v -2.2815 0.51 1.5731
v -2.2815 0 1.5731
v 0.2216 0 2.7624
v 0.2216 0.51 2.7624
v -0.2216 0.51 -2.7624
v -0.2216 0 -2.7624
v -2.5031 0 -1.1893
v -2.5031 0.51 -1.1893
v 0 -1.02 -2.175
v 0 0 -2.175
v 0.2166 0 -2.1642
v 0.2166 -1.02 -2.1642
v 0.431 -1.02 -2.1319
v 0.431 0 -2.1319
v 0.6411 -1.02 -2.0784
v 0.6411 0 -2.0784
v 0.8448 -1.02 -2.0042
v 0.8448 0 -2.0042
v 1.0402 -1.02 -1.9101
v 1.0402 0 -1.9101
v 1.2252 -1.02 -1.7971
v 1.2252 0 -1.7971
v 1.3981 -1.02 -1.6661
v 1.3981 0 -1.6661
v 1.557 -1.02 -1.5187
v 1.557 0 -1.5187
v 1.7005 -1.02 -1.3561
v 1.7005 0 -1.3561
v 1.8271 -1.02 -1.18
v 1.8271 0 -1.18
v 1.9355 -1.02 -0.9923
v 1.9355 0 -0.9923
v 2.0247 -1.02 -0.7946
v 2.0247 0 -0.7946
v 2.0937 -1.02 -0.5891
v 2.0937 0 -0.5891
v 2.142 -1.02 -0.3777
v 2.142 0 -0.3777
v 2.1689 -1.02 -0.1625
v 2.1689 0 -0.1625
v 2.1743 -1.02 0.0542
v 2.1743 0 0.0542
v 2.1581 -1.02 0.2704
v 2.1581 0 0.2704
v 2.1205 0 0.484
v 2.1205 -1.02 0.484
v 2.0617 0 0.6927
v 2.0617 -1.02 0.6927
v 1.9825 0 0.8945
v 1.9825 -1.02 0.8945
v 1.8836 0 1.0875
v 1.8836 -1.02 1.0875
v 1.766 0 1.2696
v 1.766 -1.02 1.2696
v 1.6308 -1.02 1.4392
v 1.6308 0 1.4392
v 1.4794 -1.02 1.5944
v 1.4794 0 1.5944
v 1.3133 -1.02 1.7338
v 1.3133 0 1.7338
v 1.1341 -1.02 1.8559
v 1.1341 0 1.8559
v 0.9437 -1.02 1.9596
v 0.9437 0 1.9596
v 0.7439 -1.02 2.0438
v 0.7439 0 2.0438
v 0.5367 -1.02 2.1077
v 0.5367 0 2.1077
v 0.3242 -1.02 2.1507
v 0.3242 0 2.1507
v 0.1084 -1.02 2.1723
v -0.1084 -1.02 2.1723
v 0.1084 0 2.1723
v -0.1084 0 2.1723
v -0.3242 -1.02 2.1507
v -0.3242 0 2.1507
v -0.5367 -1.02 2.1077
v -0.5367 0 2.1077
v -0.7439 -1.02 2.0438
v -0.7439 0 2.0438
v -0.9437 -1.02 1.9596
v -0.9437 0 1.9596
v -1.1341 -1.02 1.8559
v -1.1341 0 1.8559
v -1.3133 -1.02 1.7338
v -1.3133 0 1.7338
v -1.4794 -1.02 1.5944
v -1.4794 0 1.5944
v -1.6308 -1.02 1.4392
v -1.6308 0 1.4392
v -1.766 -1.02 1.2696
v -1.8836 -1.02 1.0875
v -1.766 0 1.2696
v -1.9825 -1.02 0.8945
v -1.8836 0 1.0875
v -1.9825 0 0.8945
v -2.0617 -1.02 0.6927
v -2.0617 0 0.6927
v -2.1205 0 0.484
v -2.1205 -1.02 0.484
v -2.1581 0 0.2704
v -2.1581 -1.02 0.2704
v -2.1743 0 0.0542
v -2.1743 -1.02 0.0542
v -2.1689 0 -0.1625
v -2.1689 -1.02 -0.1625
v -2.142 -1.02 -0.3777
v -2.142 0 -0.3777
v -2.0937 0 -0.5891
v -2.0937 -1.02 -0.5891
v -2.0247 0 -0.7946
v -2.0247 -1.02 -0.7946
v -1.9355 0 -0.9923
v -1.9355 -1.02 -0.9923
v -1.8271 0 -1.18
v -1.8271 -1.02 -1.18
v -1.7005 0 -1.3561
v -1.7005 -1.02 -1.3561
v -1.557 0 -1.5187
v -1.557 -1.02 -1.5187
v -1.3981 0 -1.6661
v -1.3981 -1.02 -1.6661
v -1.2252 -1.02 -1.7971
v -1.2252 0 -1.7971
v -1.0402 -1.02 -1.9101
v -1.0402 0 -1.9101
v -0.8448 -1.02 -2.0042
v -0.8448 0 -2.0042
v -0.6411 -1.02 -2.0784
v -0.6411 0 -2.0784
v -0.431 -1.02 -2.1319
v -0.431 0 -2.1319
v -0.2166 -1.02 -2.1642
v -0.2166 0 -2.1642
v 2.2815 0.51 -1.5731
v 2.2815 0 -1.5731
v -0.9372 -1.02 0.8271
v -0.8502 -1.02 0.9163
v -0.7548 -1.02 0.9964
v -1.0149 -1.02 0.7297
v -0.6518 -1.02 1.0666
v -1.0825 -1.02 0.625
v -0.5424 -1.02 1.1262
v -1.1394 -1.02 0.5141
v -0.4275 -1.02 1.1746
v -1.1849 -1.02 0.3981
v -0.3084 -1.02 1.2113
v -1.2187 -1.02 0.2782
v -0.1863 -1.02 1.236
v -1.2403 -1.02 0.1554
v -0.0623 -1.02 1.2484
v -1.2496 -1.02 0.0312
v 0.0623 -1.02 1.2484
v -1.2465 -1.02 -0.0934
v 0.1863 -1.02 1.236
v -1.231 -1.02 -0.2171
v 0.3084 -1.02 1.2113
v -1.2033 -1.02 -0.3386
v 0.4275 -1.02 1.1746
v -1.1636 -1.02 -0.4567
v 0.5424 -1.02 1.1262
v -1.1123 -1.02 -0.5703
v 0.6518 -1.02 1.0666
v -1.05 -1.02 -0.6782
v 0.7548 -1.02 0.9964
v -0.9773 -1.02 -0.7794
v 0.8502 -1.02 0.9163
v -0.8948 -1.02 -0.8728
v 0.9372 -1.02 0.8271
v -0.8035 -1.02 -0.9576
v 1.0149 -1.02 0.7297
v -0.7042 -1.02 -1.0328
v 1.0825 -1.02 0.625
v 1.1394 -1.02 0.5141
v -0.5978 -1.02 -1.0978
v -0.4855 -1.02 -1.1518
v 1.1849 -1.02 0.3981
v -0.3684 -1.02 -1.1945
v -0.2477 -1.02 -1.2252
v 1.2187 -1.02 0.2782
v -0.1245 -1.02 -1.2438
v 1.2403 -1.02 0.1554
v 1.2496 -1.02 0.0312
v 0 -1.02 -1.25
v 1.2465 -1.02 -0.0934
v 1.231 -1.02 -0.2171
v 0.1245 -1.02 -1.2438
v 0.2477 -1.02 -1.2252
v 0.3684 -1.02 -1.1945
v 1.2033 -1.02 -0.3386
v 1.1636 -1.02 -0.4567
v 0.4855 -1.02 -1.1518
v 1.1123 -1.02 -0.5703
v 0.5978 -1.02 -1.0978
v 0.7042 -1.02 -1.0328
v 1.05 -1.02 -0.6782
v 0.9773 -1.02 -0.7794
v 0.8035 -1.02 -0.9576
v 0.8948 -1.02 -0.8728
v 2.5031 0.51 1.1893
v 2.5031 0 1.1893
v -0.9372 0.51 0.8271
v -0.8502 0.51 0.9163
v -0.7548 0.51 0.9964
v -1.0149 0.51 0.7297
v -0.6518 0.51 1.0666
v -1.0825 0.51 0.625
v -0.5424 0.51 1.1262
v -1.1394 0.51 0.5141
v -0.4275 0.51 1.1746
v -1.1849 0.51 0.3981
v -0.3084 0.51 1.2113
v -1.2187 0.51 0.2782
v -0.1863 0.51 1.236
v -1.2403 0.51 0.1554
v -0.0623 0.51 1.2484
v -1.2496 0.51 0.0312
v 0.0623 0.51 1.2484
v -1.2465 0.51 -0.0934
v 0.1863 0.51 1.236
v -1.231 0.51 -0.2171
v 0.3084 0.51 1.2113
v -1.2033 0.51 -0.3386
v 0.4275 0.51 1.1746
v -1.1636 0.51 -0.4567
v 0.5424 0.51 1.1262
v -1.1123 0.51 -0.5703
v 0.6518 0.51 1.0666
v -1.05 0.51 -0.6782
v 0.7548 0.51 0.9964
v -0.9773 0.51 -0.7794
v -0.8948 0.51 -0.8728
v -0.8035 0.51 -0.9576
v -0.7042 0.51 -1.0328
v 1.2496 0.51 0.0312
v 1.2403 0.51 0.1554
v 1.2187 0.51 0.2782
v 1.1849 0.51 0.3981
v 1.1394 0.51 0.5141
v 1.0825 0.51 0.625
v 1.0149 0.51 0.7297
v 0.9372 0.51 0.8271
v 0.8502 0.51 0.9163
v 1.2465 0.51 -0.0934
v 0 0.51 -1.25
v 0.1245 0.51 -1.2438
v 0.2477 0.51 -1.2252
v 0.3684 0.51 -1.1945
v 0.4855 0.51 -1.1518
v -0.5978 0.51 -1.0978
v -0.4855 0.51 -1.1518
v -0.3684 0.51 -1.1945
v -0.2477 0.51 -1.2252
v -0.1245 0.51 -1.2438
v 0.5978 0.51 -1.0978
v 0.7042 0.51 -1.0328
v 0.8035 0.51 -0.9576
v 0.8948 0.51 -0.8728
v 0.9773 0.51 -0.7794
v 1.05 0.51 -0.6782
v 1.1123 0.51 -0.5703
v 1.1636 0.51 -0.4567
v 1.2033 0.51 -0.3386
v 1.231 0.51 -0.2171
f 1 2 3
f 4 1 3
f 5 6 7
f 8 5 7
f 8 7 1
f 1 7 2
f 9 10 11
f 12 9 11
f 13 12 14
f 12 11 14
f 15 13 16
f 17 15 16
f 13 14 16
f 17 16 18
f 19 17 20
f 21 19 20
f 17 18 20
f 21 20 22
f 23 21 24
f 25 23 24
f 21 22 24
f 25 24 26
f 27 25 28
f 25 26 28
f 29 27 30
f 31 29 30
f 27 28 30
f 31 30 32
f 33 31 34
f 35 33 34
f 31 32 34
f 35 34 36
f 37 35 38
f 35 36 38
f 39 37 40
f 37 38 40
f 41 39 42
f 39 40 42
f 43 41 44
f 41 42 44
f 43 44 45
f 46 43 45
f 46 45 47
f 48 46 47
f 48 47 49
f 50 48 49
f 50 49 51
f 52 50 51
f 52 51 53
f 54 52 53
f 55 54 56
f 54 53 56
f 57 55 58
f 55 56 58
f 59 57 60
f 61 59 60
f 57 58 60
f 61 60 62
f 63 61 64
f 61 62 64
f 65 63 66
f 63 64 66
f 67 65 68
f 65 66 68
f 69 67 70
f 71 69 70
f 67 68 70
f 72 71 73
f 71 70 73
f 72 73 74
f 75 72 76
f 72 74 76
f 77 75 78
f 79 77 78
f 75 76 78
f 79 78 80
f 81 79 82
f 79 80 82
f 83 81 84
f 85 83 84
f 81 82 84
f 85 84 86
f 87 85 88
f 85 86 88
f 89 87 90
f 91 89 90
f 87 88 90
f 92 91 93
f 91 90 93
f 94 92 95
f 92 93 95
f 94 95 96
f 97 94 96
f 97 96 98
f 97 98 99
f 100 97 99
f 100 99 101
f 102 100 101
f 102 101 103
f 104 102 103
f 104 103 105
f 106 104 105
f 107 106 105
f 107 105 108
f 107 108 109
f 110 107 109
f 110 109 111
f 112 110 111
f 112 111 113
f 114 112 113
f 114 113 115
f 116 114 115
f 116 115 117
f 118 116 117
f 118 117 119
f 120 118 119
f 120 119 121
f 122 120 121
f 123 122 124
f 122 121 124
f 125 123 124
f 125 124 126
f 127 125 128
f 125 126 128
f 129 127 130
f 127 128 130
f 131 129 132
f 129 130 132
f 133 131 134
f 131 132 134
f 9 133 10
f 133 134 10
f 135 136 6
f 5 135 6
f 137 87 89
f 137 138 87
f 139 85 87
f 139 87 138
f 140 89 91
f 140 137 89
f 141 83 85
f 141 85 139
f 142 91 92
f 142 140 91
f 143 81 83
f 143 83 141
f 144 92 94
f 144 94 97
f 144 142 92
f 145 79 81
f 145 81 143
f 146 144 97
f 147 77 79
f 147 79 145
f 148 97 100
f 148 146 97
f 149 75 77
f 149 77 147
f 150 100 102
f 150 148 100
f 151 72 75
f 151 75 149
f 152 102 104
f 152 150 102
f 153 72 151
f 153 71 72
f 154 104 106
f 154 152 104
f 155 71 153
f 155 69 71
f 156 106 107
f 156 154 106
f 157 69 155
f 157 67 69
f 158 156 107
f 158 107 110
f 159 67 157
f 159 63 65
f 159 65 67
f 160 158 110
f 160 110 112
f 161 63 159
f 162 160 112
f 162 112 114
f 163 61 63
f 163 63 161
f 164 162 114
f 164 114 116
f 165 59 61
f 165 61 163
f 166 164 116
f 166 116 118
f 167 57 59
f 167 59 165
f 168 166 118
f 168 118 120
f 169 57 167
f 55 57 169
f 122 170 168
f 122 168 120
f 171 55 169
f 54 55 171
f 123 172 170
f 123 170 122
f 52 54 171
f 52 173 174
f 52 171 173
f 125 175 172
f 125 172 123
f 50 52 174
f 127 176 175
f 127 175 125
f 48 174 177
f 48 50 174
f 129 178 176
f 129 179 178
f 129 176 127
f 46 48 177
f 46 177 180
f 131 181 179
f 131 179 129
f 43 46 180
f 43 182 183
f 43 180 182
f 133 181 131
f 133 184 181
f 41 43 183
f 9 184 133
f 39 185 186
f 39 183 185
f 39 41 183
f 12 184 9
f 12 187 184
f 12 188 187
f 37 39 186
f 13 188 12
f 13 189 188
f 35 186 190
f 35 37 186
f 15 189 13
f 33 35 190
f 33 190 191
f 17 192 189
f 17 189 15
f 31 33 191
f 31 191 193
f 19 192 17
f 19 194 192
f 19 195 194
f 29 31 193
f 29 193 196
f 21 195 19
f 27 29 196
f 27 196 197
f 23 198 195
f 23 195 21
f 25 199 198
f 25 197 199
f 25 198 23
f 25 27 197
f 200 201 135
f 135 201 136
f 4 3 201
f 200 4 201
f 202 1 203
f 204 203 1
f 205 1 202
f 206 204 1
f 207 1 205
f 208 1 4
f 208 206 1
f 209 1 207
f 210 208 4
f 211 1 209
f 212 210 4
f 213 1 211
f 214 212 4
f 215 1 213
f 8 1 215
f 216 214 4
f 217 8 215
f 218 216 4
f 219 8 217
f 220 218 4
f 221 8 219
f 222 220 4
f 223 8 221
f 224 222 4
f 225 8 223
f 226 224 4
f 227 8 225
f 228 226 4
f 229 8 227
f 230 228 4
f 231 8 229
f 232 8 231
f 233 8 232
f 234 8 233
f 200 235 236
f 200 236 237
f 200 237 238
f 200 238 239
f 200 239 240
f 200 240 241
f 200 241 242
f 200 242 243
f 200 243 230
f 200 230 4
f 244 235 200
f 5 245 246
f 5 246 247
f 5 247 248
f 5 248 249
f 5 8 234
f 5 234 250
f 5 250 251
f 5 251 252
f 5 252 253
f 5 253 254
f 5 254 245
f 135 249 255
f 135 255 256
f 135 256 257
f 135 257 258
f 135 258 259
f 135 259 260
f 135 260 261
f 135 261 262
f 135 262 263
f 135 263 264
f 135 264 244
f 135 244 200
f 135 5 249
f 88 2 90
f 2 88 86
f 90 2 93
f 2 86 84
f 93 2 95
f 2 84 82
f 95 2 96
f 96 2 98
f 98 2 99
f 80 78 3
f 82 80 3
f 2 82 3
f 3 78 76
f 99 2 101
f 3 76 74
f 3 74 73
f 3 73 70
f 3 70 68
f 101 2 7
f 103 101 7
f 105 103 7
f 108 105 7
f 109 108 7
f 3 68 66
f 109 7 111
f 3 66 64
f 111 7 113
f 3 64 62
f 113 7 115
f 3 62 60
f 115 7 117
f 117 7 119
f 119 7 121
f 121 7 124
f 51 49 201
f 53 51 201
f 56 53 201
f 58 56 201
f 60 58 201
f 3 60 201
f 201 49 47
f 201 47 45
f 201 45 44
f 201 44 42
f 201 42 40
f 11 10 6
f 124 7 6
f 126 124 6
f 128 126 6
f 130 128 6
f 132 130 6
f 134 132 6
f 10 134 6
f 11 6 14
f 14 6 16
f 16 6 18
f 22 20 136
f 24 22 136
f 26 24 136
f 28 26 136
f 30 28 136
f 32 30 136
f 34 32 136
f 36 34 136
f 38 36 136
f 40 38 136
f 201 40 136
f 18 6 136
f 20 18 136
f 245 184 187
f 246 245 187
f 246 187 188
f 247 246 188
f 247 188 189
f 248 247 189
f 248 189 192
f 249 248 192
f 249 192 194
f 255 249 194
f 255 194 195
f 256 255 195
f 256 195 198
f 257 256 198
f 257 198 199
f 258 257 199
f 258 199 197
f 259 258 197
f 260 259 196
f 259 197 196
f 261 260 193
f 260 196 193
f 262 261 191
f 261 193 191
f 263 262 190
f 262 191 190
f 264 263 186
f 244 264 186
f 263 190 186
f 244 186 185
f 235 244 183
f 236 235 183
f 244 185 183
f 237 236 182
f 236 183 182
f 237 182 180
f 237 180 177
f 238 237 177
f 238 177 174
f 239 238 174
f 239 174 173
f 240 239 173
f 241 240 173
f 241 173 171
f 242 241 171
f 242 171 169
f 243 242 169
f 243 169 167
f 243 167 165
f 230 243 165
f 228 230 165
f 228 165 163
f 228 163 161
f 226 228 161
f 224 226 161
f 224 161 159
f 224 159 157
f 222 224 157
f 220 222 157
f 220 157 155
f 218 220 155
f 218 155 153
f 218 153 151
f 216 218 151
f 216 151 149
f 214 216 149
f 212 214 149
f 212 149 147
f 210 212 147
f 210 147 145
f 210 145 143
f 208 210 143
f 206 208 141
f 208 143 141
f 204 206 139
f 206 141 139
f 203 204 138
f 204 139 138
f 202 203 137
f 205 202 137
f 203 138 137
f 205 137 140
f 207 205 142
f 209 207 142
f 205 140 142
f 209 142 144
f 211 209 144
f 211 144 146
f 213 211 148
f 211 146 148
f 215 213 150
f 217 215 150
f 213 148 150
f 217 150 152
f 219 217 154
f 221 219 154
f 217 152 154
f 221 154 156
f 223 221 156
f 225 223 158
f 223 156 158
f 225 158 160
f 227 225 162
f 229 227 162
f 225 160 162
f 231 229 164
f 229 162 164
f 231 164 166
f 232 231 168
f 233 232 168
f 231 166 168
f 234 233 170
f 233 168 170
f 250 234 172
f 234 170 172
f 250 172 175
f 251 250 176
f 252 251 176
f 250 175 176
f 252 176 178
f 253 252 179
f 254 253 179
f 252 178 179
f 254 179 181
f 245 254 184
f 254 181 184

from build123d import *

# Parameters (mm, degrees)
EXTRUDE_1_DEPTH     = 0.51
SKETCH_2_R          = 2.175
EXTRUDE_2_DEPTH     = 1.02
SKETCH_3_R          = 1.25
CUT_EXTRUDE_1_DEPTH = 5.029563181


with BuildPart() as part:
    # 草图1 → 凸台-拉伸1 (new body)
    with BuildSketch(Plane(origin=(0, 0, 0), x_dir=(1, 0, 0), z_dir=(0, 1, 0))):
        Polygon((2.503115377, -1.189291137), (2.281514026, 1.573115937), (-0.221601352, 2.762407074), (-2.503115377, 1.189291137), (-2.281514026, -1.573115937), (0.221601352, -2.762407074), align=None)
    extrude(amount=EXTRUDE_1_DEPTH)

    # 草图2 → 凸台-拉伸2 (add)
    with BuildSketch(Plane.XZ):
        with Locations(Location((0, 0, 0), (0, 0, 270))):
            Circle(SKETCH_2_R)
    extrude(amount=EXTRUDE_2_DEPTH)

    # 草图3 → 切除-拉伸1 (cut, through all)
    with BuildSketch(Plane(origin=(0, -1.02, 0), x_dir=(-1, 0, 0), z_dir=(0, -1, 0))):
        with Locations(Location((0, 0, 0), (0, 0, 90))):
            Circle(SKETCH_3_R)
    extrude(amount=-CUT_EXTRUDE_1_DEPTH, mode=Mode.SUBTRACT)


solid = part.part
